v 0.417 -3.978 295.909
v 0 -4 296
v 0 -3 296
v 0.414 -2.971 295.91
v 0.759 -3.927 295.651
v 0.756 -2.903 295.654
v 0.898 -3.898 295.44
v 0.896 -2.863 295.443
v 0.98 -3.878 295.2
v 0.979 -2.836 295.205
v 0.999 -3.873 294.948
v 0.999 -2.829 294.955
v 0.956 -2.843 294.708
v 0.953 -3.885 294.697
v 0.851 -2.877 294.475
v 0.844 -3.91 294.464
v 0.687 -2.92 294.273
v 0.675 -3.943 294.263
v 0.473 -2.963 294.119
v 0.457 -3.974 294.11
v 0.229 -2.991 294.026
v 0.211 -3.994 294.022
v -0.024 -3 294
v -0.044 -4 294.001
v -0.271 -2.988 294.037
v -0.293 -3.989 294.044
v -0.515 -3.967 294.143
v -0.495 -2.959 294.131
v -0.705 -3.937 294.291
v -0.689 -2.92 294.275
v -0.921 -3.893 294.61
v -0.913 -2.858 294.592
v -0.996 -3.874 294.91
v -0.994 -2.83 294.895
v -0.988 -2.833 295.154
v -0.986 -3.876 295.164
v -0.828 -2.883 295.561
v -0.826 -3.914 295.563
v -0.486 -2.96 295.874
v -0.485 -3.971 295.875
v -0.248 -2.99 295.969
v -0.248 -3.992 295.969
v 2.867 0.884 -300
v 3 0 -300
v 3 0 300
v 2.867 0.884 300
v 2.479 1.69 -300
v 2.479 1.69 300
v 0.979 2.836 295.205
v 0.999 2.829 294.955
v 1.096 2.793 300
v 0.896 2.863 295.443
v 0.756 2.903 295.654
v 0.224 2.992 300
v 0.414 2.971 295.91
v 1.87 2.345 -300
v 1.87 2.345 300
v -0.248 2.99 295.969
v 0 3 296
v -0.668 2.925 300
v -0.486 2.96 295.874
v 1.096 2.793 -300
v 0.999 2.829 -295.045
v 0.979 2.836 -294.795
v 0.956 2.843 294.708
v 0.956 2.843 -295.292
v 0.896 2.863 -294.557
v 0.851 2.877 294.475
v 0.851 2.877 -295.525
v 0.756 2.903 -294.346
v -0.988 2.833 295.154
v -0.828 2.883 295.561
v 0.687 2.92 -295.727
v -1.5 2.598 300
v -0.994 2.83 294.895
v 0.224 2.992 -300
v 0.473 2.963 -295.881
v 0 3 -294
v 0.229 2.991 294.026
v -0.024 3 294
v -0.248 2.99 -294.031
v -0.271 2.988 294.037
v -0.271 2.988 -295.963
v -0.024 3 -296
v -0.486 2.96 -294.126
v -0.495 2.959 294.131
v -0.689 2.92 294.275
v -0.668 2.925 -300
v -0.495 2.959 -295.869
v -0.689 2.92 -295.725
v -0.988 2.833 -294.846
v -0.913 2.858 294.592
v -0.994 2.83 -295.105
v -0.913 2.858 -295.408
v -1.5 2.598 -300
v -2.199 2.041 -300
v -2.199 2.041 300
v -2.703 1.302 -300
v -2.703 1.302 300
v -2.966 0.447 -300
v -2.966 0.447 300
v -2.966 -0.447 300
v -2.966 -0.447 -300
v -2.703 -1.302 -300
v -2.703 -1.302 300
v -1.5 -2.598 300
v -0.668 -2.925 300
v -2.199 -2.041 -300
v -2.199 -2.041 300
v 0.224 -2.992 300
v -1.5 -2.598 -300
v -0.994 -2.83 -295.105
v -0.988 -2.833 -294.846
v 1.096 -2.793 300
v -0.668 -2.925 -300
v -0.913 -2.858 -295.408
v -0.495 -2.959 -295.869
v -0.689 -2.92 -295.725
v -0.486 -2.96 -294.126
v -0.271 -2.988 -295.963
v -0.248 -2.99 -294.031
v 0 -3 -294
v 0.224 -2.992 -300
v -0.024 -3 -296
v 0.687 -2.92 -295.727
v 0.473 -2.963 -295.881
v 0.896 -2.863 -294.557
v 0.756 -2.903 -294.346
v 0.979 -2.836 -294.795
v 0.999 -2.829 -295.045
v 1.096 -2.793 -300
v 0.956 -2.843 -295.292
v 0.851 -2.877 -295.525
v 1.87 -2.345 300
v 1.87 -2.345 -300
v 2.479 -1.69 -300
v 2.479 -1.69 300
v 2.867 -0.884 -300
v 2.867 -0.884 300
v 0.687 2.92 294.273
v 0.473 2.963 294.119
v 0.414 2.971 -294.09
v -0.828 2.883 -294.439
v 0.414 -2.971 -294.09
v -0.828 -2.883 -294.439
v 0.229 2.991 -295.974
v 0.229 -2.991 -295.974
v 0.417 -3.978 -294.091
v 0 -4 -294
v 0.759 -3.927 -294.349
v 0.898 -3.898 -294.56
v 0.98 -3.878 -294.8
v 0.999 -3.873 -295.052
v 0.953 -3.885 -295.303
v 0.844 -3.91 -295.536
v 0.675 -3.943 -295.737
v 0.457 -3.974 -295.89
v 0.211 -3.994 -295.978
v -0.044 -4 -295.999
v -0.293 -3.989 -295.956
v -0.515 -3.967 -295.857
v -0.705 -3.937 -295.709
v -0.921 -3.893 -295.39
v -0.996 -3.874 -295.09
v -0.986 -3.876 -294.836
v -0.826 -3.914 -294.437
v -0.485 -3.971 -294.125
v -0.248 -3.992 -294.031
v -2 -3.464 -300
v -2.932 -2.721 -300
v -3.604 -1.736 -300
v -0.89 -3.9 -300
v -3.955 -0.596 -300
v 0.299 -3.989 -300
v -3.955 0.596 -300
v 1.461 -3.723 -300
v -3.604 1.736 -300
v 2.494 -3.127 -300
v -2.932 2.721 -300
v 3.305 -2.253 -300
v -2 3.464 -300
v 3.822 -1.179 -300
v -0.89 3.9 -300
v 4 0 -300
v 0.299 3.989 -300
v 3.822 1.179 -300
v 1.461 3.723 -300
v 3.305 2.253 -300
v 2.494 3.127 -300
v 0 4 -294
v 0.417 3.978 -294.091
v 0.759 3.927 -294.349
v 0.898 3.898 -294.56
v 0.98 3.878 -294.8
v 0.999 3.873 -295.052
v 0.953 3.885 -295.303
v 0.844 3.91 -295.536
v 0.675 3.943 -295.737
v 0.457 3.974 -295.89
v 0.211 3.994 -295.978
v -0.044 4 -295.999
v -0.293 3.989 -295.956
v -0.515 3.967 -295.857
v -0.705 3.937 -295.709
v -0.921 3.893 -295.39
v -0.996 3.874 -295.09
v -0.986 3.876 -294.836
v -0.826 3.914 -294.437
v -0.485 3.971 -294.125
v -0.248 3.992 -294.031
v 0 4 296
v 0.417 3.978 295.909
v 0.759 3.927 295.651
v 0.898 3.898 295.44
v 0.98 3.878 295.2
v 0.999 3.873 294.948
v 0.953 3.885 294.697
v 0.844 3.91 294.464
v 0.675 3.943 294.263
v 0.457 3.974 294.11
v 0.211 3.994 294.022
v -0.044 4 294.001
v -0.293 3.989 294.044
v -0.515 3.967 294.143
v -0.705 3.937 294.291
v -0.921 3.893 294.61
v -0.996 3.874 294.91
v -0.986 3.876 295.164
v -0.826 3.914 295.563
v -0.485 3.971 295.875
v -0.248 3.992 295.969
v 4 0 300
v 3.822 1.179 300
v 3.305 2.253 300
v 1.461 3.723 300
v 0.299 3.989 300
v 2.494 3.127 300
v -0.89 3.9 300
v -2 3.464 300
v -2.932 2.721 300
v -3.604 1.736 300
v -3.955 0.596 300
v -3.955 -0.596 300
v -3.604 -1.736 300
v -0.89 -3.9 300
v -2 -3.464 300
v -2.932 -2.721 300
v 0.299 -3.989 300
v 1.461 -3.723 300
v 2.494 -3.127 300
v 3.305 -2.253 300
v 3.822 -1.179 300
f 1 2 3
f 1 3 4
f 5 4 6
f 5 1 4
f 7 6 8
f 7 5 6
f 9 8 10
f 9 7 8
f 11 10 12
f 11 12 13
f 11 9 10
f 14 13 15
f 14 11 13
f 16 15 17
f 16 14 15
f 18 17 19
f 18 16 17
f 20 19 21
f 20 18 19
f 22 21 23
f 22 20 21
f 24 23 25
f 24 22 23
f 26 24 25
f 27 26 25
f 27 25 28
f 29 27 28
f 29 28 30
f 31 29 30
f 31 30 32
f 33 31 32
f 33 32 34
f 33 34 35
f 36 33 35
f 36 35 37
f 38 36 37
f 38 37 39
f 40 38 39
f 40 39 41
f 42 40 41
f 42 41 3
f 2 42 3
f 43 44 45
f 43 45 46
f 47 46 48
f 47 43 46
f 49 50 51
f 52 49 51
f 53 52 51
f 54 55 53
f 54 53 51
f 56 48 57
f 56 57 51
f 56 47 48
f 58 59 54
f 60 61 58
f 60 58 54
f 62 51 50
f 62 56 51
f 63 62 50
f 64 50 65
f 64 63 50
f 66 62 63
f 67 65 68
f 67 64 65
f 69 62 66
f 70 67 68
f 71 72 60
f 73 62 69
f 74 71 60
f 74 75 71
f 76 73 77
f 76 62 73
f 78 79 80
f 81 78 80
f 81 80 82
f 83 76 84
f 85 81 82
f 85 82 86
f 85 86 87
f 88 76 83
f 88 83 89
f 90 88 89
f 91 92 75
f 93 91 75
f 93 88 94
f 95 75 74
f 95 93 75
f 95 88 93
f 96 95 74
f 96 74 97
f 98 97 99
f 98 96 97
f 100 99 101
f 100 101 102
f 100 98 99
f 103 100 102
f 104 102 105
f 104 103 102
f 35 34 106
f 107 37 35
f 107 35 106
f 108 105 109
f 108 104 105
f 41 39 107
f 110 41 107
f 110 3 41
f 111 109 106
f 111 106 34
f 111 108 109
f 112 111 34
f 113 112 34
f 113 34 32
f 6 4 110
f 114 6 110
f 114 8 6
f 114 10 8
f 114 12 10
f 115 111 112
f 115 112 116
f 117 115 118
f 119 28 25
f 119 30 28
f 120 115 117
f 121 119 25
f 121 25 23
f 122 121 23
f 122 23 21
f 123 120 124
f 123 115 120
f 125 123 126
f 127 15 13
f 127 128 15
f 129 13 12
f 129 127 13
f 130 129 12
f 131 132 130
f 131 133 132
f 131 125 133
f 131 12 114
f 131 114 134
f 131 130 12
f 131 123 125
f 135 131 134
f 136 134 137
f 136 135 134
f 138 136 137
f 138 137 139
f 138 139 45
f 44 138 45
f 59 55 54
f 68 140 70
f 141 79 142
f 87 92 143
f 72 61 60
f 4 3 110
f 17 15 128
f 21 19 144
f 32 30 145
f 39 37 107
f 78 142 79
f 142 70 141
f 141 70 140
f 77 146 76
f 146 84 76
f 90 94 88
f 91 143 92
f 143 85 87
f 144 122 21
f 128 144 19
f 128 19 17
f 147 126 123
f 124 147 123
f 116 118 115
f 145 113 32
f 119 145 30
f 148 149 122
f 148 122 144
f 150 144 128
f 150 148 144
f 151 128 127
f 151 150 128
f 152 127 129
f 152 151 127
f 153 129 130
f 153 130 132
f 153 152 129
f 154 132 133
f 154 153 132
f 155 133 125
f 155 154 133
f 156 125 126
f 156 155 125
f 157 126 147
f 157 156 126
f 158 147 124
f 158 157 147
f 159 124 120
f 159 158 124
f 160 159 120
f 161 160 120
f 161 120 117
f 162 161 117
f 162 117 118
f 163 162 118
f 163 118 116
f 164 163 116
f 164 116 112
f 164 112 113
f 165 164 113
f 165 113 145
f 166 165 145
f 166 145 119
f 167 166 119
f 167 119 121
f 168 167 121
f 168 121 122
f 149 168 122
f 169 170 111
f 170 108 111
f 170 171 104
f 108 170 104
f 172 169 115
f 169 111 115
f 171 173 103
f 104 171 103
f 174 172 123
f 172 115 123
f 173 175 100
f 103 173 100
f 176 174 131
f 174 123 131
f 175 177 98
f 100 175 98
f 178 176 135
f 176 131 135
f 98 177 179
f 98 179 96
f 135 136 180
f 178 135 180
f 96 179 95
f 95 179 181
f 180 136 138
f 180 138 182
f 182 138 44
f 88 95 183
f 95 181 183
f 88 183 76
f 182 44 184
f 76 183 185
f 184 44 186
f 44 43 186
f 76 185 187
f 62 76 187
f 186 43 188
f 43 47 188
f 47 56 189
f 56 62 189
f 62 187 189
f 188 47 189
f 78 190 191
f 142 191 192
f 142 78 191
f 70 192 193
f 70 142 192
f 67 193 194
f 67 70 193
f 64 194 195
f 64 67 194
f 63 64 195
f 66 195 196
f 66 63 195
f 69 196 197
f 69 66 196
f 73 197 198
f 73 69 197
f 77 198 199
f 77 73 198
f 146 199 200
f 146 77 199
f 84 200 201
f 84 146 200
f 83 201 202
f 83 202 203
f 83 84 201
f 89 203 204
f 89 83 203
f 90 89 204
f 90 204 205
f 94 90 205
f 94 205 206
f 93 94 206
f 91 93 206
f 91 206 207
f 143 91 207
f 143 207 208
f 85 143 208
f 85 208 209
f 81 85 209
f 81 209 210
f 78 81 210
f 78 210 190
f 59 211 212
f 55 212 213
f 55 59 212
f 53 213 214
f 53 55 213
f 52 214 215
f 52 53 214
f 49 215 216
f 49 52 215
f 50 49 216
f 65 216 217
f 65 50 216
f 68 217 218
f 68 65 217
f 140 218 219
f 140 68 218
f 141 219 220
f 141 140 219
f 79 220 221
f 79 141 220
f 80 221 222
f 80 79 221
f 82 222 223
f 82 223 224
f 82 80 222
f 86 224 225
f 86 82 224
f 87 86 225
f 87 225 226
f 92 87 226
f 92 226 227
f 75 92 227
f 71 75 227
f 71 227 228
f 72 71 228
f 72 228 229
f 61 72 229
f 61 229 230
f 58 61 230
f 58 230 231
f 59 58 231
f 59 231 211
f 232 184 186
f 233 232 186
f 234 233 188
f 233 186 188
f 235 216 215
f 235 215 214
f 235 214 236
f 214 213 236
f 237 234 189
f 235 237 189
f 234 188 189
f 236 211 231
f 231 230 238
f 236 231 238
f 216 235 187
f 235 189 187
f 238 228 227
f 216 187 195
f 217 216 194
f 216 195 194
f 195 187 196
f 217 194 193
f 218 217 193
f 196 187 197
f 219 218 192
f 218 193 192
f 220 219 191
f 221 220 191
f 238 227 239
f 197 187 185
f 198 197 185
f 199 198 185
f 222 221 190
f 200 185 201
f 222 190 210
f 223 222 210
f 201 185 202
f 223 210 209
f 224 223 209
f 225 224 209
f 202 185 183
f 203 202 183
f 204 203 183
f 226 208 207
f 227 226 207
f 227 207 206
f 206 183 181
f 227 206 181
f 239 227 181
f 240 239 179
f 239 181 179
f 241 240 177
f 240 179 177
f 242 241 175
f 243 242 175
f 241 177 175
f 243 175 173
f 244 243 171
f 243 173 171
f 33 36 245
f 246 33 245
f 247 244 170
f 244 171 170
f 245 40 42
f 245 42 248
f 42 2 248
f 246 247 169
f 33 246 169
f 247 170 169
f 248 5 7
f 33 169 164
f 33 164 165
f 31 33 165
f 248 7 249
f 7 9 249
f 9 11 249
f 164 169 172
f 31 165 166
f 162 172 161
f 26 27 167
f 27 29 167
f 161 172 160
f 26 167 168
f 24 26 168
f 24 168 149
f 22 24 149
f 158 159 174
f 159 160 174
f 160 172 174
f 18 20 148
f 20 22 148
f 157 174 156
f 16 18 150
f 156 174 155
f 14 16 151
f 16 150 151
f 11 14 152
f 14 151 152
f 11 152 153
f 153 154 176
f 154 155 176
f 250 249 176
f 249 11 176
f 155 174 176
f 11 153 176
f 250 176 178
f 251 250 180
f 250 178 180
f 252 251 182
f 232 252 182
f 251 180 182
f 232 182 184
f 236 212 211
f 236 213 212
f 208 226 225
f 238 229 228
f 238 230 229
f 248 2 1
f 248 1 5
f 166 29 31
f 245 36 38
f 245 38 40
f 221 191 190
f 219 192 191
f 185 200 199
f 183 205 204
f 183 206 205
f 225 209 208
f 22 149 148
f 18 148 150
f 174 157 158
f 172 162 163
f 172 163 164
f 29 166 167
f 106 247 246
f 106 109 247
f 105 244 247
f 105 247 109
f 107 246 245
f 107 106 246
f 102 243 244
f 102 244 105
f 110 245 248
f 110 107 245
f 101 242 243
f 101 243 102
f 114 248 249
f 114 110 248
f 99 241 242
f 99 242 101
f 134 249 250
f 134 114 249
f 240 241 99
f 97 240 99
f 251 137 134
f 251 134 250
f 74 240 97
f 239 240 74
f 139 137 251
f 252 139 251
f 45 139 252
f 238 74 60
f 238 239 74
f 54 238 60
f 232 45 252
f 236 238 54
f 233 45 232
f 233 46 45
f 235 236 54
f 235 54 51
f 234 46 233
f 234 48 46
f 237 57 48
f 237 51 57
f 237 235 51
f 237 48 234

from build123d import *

# Parameters (mm, degrees)
EXTRUDE_1_DEPTH          = 300
EXTRUDE_1_DEPTH_BACK     = 300
SKETCH_1_R               = 4
SKETCH_1_R_2             = 3
CUT_EXTRUDE_2_DEPTH      = 301.053328593
CUT_EXTRUDE_2_DEPTH_BACK = 301.053328593
SKETCH_3_R               = 1


with BuildPart() as part:
    # 草图1 → 凸台-拉伸1 (new, two sides: drawn at the far end of the back side and taken through both)
    with BuildSketch(Plane.XY.offset(-EXTRUDE_1_DEPTH_BACK)):
        Circle(SKETCH_1_R)
        Circle(SKETCH_1_R_2, mode=Mode.SUBTRACT)
    extrude(amount=EXTRUDE_1_DEPTH + EXTRUDE_1_DEPTH_BACK)

    # 草图3 → 切除-拉伸2 (cut, two sides: drawn at the far end of the back side and taken through both)
    with BuildSketch(Plane(origin=(0, 0, 0), x_dir=(1, 0, 0), z_dir=(0, 1, 0)).offset(-CUT_EXTRUDE_2_DEPTH_BACK)):
        with Locations((0, 295)):
            Circle(SKETCH_3_R)
        with Locations((0, -295)):
            Circle(SKETCH_3_R)
    extrude(amount=CUT_EXTRUDE_2_DEPTH + CUT_EXTRUDE_2_DEPTH_BACK, mode=Mode.SUBTRACT)


solid = part.part
